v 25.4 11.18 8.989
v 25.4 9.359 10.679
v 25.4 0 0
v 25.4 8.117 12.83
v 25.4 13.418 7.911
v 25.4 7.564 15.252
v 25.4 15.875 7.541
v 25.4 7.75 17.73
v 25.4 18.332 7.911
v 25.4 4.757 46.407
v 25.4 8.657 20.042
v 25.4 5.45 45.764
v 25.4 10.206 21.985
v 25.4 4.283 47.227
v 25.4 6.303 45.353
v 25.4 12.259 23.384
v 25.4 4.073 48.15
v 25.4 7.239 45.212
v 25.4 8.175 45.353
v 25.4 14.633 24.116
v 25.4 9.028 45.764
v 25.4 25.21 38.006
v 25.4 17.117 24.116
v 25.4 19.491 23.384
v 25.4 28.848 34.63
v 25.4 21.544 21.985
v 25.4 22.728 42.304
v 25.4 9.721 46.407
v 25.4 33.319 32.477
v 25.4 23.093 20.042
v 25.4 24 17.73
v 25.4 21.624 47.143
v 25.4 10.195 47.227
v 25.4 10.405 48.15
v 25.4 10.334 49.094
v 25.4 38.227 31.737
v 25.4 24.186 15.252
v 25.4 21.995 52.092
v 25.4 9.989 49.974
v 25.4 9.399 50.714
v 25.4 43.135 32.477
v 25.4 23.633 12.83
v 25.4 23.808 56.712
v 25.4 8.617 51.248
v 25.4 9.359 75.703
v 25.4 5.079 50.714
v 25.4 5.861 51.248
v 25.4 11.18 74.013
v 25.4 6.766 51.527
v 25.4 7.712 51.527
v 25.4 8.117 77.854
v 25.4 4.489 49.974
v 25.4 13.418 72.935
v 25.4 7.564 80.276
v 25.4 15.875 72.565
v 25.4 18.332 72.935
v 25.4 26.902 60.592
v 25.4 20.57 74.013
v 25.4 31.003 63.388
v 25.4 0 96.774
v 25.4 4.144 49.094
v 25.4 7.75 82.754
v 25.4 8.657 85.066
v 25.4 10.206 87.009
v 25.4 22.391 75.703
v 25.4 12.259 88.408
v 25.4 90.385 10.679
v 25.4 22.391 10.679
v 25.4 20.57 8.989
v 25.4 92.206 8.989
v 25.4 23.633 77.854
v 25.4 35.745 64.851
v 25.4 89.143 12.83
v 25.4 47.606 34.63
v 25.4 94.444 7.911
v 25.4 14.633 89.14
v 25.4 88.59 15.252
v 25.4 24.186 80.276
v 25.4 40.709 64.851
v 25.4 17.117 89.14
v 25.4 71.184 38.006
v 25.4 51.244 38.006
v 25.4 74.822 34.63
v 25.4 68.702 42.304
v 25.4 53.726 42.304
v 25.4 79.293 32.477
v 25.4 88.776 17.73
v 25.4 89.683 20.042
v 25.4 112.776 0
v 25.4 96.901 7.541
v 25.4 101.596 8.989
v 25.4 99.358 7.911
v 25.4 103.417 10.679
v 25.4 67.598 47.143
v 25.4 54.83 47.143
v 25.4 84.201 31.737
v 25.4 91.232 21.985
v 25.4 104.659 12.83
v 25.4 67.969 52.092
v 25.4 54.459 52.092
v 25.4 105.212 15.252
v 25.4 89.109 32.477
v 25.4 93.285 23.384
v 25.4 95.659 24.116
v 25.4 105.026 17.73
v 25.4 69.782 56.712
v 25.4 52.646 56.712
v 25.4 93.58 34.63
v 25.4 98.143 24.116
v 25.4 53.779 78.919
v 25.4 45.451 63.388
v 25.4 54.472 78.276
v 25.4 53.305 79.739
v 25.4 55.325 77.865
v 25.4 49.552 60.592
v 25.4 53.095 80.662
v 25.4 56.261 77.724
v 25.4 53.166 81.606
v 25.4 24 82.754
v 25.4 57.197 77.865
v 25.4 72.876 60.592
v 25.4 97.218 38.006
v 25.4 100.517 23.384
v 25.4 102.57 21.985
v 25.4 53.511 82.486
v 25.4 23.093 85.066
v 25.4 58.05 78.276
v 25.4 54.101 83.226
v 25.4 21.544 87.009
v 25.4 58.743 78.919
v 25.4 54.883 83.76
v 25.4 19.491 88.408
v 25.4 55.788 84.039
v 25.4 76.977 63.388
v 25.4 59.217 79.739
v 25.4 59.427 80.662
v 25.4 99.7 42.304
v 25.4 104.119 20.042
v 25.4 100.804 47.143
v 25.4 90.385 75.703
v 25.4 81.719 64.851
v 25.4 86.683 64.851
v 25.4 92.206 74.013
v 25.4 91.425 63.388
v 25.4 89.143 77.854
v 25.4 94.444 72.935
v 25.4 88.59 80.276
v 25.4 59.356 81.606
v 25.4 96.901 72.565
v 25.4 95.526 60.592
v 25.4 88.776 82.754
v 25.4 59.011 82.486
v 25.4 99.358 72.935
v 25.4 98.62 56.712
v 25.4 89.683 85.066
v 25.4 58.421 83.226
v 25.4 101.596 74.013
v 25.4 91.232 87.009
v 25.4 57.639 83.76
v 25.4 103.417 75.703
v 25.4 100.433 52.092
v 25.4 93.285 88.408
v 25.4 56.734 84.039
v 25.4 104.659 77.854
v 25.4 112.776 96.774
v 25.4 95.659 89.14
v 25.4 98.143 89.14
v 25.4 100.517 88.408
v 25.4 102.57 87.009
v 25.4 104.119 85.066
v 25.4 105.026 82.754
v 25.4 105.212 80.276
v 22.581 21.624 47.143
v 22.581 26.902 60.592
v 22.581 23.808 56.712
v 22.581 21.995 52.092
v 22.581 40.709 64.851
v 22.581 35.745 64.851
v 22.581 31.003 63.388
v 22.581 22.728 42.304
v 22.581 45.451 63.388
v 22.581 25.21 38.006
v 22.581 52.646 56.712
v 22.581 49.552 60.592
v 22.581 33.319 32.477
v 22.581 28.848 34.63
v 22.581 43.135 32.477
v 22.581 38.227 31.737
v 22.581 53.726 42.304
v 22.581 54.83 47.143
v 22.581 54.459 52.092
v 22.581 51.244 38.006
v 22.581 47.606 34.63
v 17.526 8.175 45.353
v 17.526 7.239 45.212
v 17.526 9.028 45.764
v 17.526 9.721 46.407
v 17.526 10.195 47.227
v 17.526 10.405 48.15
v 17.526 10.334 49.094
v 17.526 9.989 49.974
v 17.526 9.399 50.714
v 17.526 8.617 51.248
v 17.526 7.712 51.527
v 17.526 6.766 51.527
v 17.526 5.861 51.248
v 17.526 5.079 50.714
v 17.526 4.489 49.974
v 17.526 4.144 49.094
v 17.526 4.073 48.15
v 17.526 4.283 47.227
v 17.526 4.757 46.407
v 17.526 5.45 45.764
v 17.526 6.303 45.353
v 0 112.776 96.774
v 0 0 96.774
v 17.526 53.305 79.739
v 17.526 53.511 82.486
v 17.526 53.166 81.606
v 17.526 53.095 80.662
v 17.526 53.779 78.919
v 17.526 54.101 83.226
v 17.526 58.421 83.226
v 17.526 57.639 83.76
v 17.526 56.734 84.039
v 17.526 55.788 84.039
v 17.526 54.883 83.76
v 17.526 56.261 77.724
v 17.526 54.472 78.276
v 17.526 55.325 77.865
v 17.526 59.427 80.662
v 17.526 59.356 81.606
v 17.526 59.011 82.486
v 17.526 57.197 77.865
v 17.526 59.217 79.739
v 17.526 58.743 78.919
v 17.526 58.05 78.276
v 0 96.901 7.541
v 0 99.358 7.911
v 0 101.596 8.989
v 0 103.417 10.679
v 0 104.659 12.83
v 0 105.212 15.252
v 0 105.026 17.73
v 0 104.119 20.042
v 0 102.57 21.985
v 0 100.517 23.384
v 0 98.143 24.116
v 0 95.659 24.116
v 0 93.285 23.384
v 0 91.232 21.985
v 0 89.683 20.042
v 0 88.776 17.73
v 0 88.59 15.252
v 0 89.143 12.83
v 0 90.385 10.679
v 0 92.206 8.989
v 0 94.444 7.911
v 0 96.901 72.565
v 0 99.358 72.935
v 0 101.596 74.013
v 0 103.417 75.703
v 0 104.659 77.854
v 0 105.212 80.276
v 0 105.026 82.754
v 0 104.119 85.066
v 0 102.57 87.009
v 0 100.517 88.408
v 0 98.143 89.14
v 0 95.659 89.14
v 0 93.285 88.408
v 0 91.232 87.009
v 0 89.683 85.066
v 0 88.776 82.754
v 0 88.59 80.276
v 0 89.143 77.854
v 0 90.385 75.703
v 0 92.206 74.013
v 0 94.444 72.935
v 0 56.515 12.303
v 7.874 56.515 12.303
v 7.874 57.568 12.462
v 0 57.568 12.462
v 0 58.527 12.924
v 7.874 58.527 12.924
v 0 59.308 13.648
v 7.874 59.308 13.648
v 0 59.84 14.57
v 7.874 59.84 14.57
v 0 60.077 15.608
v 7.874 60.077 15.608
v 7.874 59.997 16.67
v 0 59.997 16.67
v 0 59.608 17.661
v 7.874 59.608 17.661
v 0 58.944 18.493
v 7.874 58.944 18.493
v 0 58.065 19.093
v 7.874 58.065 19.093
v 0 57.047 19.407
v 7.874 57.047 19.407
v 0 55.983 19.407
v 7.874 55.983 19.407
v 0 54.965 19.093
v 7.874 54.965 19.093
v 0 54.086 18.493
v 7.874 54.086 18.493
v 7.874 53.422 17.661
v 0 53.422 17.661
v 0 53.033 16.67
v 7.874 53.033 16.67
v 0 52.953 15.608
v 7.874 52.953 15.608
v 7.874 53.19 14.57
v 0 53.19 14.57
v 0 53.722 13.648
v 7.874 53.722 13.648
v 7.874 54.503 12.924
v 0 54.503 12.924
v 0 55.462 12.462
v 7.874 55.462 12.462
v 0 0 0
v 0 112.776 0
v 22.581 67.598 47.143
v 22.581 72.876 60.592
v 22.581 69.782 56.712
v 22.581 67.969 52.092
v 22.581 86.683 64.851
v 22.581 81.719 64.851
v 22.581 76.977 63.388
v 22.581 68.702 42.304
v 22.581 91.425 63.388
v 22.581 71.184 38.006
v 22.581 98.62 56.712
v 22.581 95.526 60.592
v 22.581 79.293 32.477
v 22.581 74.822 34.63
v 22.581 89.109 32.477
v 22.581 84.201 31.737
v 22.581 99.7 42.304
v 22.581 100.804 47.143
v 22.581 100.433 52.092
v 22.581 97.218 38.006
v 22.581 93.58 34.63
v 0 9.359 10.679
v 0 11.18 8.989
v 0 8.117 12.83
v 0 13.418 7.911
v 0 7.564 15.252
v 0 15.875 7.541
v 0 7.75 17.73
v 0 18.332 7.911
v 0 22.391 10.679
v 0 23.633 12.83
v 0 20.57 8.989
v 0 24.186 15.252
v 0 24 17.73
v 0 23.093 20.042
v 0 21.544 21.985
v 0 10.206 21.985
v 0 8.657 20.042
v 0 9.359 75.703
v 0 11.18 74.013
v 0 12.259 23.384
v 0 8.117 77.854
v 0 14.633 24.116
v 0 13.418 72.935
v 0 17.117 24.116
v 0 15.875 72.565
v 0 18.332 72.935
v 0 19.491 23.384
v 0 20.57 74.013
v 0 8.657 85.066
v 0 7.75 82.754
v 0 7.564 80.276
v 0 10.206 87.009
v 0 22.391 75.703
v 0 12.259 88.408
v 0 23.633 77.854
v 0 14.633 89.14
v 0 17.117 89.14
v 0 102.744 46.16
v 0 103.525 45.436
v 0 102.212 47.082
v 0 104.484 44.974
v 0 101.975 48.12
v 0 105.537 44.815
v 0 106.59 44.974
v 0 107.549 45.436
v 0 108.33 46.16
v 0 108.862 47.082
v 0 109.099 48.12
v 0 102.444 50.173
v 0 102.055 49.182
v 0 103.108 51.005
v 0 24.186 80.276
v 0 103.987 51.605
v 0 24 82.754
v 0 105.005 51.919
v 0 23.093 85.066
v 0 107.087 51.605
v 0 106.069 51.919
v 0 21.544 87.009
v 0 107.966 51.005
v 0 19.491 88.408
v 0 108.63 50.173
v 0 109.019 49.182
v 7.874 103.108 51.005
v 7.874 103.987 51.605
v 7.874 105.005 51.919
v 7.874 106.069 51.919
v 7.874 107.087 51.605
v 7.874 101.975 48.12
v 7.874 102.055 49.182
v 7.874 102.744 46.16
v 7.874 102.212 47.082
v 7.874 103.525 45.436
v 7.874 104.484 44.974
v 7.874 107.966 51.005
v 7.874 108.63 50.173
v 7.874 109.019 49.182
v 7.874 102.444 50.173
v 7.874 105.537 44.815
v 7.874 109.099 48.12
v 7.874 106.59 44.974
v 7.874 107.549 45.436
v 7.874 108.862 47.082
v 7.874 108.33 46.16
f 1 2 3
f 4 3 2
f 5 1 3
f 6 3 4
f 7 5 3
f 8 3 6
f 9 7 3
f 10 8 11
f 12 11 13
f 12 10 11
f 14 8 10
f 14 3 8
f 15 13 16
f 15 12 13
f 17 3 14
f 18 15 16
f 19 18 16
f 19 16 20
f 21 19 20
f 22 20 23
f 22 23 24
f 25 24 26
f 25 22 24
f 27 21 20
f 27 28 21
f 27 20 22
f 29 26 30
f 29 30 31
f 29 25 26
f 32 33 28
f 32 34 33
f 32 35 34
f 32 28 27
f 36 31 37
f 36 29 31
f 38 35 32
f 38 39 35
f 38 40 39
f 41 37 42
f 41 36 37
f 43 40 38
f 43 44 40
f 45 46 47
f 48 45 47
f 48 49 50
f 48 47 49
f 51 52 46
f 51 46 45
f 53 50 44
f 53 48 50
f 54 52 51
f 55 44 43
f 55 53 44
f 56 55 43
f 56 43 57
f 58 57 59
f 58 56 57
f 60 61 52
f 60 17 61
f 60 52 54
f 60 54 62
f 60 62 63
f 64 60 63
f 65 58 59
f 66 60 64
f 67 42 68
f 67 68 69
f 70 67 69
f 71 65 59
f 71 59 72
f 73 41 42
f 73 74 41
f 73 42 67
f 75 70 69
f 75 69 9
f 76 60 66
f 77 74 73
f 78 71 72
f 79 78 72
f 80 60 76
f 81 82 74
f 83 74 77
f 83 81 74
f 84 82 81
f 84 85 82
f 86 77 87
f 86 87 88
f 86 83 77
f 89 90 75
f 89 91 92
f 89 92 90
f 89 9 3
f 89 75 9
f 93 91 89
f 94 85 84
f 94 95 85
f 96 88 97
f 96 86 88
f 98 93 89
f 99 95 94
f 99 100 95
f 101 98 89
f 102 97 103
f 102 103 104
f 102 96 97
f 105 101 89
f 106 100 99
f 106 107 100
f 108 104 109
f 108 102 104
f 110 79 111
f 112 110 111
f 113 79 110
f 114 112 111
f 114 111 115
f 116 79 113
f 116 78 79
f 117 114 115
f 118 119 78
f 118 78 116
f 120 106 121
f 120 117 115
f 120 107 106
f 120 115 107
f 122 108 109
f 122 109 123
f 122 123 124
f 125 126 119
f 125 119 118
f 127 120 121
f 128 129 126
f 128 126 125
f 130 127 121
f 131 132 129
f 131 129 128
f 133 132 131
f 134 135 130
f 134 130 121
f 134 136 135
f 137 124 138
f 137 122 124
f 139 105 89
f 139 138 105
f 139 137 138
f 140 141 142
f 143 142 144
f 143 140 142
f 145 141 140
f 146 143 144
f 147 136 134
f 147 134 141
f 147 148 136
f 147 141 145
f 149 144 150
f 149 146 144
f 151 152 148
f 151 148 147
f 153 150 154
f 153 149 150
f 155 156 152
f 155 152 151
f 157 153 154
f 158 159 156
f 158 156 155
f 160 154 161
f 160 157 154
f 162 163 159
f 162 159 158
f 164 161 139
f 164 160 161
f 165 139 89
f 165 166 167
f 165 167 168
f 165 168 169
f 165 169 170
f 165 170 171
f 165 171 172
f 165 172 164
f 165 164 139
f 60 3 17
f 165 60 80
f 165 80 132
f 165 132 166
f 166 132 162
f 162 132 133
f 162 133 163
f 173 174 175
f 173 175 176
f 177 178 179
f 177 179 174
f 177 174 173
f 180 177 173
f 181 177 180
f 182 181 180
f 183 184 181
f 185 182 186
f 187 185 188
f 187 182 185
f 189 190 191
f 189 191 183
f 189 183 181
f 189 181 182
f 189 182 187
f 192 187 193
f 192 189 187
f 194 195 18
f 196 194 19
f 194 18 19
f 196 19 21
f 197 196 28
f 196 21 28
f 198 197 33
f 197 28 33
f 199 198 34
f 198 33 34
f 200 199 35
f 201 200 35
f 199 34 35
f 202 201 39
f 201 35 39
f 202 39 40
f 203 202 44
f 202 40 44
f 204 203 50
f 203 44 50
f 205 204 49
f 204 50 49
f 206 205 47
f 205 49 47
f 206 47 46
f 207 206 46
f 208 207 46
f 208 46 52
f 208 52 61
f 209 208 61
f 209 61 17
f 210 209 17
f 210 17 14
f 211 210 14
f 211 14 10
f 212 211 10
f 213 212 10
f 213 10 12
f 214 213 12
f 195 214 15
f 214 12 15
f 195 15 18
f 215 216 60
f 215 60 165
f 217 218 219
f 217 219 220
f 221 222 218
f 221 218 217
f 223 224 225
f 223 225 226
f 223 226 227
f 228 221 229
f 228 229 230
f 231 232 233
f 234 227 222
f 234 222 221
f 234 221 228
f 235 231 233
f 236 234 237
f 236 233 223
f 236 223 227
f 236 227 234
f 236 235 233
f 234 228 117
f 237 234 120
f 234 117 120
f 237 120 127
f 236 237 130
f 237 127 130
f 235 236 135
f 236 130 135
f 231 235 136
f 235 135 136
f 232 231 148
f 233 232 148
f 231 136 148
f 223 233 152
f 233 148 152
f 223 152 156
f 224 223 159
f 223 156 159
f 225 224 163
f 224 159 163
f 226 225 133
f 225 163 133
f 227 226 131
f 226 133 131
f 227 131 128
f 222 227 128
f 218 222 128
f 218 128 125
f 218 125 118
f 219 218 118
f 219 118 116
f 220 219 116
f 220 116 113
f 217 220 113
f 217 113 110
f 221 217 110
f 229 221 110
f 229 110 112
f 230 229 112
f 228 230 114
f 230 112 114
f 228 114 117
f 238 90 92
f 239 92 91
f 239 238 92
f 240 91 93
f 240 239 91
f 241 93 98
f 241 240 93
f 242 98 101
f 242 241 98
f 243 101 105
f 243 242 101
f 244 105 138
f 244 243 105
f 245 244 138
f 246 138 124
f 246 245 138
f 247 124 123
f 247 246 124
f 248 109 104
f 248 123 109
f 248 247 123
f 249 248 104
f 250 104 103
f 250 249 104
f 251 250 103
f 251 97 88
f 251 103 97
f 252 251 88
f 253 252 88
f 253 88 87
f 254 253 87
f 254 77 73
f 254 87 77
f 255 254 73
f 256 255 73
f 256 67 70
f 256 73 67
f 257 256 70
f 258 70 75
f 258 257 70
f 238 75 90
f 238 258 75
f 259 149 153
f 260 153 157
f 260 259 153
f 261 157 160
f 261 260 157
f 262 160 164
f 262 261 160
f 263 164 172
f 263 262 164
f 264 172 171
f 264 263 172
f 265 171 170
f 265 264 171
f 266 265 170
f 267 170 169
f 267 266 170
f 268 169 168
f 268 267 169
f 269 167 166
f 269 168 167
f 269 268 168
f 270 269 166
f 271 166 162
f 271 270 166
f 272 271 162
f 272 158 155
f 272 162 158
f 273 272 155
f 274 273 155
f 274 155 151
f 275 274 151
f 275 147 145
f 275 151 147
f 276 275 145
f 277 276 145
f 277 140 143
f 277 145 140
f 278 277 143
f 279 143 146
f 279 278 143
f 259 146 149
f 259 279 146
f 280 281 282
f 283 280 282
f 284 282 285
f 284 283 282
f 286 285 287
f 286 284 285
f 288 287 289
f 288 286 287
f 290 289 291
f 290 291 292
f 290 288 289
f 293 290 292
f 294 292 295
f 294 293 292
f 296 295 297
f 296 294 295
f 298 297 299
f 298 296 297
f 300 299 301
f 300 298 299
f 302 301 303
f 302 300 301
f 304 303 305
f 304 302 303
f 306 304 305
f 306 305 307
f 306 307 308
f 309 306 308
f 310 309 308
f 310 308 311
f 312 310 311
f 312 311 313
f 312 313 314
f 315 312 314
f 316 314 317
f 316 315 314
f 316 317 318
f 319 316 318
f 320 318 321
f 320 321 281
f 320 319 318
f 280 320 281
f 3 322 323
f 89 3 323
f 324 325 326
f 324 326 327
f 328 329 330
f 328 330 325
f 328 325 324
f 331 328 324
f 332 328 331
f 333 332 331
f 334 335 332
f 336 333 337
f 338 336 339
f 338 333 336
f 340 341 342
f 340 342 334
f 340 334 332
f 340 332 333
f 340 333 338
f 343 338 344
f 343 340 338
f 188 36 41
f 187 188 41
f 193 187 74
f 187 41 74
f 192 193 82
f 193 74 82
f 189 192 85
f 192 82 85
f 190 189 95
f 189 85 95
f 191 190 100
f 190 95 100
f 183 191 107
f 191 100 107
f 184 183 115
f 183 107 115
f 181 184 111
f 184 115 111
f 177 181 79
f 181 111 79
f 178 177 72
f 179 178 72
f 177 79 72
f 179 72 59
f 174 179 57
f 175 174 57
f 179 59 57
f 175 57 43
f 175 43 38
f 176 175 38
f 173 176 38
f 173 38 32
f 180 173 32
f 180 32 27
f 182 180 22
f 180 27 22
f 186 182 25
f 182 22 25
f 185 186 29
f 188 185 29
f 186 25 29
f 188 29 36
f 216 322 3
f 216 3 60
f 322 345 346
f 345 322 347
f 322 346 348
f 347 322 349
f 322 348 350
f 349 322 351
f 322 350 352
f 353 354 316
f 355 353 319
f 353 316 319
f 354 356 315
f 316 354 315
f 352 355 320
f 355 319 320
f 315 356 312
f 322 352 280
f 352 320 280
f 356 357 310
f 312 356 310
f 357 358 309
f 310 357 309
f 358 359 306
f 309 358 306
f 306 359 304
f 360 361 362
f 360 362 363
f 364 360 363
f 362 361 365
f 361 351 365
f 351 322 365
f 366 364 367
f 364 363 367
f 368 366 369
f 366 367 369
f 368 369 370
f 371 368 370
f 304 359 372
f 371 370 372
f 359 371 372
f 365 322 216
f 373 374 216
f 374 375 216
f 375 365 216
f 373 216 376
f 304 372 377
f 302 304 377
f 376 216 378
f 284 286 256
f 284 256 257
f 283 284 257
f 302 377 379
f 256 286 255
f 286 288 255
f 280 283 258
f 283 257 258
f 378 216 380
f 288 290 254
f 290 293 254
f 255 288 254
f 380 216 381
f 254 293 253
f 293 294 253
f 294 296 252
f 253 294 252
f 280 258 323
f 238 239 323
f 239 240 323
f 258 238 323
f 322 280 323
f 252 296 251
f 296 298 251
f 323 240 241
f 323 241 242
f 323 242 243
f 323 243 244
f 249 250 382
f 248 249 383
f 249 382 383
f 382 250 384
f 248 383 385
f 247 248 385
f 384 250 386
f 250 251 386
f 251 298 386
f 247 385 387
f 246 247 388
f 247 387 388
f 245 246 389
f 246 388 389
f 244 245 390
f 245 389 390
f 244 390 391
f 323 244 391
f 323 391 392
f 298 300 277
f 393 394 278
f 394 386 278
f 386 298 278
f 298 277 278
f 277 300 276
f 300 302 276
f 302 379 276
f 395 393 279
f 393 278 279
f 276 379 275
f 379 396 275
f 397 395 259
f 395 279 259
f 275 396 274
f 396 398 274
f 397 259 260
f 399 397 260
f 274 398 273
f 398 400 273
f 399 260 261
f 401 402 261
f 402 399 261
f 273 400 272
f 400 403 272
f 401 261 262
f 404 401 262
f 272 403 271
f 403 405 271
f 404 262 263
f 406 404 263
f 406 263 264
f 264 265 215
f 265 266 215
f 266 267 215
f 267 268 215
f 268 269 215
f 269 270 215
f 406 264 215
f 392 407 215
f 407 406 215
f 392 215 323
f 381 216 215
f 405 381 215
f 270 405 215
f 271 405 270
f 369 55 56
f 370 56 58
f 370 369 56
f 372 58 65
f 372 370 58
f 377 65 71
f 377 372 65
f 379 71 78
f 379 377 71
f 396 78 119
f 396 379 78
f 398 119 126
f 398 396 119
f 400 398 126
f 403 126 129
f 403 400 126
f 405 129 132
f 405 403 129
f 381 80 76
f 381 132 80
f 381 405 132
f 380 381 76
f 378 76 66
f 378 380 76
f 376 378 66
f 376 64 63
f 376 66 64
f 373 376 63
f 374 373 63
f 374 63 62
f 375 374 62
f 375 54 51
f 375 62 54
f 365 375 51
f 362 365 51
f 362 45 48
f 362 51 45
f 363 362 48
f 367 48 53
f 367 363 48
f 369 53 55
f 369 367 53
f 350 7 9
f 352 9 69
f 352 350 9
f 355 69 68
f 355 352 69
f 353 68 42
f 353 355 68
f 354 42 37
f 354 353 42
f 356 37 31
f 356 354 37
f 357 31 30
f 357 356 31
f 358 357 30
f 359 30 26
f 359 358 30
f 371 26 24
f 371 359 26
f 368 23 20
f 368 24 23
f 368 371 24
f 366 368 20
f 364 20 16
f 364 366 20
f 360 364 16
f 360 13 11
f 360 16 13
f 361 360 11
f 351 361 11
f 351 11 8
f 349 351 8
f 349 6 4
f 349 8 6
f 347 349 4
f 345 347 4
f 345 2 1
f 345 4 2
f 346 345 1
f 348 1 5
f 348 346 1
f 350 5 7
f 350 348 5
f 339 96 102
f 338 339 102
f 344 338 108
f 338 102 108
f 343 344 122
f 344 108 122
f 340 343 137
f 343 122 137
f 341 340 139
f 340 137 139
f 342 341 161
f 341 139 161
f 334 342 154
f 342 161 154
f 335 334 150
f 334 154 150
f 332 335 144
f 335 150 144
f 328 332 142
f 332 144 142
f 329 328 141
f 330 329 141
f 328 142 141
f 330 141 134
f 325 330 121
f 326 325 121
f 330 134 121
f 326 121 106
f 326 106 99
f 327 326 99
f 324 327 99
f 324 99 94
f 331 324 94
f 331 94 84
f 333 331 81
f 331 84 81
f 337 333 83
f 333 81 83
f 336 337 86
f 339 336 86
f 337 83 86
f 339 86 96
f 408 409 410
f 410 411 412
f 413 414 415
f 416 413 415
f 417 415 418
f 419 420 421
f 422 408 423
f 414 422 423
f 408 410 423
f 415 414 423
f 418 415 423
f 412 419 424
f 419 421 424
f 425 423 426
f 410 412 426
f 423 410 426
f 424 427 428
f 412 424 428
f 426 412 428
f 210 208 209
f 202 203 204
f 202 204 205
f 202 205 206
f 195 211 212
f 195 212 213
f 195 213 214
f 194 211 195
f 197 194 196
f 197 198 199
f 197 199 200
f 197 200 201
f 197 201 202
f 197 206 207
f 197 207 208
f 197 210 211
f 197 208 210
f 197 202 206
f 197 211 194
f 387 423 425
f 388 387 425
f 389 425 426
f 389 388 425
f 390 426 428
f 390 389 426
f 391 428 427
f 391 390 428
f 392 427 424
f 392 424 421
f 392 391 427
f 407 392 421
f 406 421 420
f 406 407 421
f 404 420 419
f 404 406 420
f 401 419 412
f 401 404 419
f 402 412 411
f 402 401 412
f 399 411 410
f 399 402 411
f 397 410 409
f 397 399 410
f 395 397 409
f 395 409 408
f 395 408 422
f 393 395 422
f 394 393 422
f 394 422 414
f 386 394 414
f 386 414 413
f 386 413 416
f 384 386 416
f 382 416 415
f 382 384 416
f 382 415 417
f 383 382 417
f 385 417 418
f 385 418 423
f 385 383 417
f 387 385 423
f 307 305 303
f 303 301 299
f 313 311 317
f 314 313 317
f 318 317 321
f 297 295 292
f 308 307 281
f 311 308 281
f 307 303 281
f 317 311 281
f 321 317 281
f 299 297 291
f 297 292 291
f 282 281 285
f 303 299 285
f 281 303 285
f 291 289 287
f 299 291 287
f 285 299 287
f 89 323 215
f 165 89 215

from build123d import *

# Parameters (mm, degrees)
SKETCH1_W           = 112.776
SKETCH1_H           = 96.774
BOSS_EXTRUDE1_DEPTH = 25.4
SKETCH2_R           = 8.334375
CUT_EXTRUDE2_DEPTH  = 151.760715215
SKETCH3_R           = 8.334375
CUT_EXTRUDE4_DEPTH  = 151.760715215
SKETCH4_R           = 3.571875
CUT_EXTRUDE6_DEPTH  = 7.874
SKETCH5_R           = 3.571875
CUT_EXTRUDE8_DEPTH  = 7.874
CUT_EXTRUDE10_START = 25.4
SKETCH6_R           = 3.175
CUT_EXTRUDE10_DEPTH = 7.874
CUT_EXTRUDE12_START = 25.4
SKETCH7_R           = 3.175
CUT_EXTRUDE12_DEPTH = 7.874
CUT_EXTRUDE14_START = 25.4
SKETCH8_R           = 16.6497
CUT_EXTRUDE14_DEPTH = 2.8194
CUT_EXTRUDE15_START = 25.4
SKETCH9_R           = 16.6497
CUT_EXTRUDE15_DEPTH = 2.8194


with BuildPart() as part:
    # Sketch1 → Boss-Extrude1 (new body)
    with BuildSketch(Plane.YZ):
        with Locations((56.388, 48.387)):
            Rectangle(SKETCH1_W, SKETCH1_H)
    extrude(amount=BOSS_EXTRUDE1_DEPTH)

    # Sketch2 → Cut-Extrude2 (cut, through all)
    with BuildSketch(Plane.YZ):
        with Locations(Location((15.875, 15.875, 0), (0, 0, 270))):
            Circle(SKETCH2_R)
    extrude(amount=CUT_EXTRUDE2_DEPTH, mode=Mode.SUBTRACT)

    # Sketch3 → Cut-Extrude4 (cut, through all)
    with BuildSketch(Plane.YZ):
        with Locations(Location((96.901, 15.875, 0), (0, 0, 270))):
            Circle(SKETCH3_R)
        with Locations(Location((15.875, 80.899, 0), (0, 0, 270))):
            Circle(SKETCH3_R)
        with Locations(Location((96.901, 80.899, 0), (0, 0, 270))):
            Circle(SKETCH3_R)
    extrude(amount=CUT_EXTRUDE4_DEPTH, mode=Mode.SUBTRACT)

    # Sketch4 → Cut-Extrude6 (cut)
    with BuildSketch(Plane.YZ):
        with Locations(Location((105.537, 48.387, 0), (0, 0, 270))):
            Circle(SKETCH4_R)
    extrude(amount=CUT_EXTRUDE6_DEPTH, mode=Mode.SUBTRACT)

    # Sketch5 → Cut-Extrude8 (cut)
    with BuildSketch(Plane.YZ):
        with Locations(Location((56.515, 15.875, 0), (0, 0, 270))):
            Circle(SKETCH5_R)
    extrude(amount=CUT_EXTRUDE8_DEPTH, mode=Mode.SUBTRACT)

    # Sketch6 → Cut-Extrude10 (cut)
    with BuildSketch(Plane.YZ.offset(CUT_EXTRUDE10_START)):
        with Locations(Location((7.239, 48.387, 0), (0, 0, 270))):
            Circle(SKETCH6_R)
    extrude(amount=-CUT_EXTRUDE10_DEPTH, mode=Mode.SUBTRACT)

    # Sketch7 → Cut-Extrude12 (cut)
    with BuildSketch(Plane.YZ.offset(CUT_EXTRUDE12_START)):
        with Locations(Location((56.261, 80.899, 0), (0, 0, 270))):
            Circle(SKETCH7_R)
    extrude(amount=-CUT_EXTRUDE12_DEPTH, mode=Mode.SUBTRACT)

    # Sketch8 → Cut-Extrude14 (cut)
    with BuildSketch(Plane.YZ.offset(CUT_EXTRUDE14_START)):
        with Locations(Location((38.227, 48.387, 0), (0, 0, 270))):
            Circle(SKETCH8_R)
    extrude(amount=-CUT_EXTRUDE14_DEPTH, mode=Mode.SUBTRACT)

    # Sketch9 → Cut-Extrude15 (cut)
    with BuildSketch(Plane.YZ.offset(CUT_EXTRUDE15_START)):
        with Locations(Location((84.201, 48.387, 0), (0, 0, 270))):
            Circle(SKETCH9_R)
    extrude(amount=-CUT_EXTRUDE15_DEPTH, mode=Mode.SUBTRACT)


solid = part.part
